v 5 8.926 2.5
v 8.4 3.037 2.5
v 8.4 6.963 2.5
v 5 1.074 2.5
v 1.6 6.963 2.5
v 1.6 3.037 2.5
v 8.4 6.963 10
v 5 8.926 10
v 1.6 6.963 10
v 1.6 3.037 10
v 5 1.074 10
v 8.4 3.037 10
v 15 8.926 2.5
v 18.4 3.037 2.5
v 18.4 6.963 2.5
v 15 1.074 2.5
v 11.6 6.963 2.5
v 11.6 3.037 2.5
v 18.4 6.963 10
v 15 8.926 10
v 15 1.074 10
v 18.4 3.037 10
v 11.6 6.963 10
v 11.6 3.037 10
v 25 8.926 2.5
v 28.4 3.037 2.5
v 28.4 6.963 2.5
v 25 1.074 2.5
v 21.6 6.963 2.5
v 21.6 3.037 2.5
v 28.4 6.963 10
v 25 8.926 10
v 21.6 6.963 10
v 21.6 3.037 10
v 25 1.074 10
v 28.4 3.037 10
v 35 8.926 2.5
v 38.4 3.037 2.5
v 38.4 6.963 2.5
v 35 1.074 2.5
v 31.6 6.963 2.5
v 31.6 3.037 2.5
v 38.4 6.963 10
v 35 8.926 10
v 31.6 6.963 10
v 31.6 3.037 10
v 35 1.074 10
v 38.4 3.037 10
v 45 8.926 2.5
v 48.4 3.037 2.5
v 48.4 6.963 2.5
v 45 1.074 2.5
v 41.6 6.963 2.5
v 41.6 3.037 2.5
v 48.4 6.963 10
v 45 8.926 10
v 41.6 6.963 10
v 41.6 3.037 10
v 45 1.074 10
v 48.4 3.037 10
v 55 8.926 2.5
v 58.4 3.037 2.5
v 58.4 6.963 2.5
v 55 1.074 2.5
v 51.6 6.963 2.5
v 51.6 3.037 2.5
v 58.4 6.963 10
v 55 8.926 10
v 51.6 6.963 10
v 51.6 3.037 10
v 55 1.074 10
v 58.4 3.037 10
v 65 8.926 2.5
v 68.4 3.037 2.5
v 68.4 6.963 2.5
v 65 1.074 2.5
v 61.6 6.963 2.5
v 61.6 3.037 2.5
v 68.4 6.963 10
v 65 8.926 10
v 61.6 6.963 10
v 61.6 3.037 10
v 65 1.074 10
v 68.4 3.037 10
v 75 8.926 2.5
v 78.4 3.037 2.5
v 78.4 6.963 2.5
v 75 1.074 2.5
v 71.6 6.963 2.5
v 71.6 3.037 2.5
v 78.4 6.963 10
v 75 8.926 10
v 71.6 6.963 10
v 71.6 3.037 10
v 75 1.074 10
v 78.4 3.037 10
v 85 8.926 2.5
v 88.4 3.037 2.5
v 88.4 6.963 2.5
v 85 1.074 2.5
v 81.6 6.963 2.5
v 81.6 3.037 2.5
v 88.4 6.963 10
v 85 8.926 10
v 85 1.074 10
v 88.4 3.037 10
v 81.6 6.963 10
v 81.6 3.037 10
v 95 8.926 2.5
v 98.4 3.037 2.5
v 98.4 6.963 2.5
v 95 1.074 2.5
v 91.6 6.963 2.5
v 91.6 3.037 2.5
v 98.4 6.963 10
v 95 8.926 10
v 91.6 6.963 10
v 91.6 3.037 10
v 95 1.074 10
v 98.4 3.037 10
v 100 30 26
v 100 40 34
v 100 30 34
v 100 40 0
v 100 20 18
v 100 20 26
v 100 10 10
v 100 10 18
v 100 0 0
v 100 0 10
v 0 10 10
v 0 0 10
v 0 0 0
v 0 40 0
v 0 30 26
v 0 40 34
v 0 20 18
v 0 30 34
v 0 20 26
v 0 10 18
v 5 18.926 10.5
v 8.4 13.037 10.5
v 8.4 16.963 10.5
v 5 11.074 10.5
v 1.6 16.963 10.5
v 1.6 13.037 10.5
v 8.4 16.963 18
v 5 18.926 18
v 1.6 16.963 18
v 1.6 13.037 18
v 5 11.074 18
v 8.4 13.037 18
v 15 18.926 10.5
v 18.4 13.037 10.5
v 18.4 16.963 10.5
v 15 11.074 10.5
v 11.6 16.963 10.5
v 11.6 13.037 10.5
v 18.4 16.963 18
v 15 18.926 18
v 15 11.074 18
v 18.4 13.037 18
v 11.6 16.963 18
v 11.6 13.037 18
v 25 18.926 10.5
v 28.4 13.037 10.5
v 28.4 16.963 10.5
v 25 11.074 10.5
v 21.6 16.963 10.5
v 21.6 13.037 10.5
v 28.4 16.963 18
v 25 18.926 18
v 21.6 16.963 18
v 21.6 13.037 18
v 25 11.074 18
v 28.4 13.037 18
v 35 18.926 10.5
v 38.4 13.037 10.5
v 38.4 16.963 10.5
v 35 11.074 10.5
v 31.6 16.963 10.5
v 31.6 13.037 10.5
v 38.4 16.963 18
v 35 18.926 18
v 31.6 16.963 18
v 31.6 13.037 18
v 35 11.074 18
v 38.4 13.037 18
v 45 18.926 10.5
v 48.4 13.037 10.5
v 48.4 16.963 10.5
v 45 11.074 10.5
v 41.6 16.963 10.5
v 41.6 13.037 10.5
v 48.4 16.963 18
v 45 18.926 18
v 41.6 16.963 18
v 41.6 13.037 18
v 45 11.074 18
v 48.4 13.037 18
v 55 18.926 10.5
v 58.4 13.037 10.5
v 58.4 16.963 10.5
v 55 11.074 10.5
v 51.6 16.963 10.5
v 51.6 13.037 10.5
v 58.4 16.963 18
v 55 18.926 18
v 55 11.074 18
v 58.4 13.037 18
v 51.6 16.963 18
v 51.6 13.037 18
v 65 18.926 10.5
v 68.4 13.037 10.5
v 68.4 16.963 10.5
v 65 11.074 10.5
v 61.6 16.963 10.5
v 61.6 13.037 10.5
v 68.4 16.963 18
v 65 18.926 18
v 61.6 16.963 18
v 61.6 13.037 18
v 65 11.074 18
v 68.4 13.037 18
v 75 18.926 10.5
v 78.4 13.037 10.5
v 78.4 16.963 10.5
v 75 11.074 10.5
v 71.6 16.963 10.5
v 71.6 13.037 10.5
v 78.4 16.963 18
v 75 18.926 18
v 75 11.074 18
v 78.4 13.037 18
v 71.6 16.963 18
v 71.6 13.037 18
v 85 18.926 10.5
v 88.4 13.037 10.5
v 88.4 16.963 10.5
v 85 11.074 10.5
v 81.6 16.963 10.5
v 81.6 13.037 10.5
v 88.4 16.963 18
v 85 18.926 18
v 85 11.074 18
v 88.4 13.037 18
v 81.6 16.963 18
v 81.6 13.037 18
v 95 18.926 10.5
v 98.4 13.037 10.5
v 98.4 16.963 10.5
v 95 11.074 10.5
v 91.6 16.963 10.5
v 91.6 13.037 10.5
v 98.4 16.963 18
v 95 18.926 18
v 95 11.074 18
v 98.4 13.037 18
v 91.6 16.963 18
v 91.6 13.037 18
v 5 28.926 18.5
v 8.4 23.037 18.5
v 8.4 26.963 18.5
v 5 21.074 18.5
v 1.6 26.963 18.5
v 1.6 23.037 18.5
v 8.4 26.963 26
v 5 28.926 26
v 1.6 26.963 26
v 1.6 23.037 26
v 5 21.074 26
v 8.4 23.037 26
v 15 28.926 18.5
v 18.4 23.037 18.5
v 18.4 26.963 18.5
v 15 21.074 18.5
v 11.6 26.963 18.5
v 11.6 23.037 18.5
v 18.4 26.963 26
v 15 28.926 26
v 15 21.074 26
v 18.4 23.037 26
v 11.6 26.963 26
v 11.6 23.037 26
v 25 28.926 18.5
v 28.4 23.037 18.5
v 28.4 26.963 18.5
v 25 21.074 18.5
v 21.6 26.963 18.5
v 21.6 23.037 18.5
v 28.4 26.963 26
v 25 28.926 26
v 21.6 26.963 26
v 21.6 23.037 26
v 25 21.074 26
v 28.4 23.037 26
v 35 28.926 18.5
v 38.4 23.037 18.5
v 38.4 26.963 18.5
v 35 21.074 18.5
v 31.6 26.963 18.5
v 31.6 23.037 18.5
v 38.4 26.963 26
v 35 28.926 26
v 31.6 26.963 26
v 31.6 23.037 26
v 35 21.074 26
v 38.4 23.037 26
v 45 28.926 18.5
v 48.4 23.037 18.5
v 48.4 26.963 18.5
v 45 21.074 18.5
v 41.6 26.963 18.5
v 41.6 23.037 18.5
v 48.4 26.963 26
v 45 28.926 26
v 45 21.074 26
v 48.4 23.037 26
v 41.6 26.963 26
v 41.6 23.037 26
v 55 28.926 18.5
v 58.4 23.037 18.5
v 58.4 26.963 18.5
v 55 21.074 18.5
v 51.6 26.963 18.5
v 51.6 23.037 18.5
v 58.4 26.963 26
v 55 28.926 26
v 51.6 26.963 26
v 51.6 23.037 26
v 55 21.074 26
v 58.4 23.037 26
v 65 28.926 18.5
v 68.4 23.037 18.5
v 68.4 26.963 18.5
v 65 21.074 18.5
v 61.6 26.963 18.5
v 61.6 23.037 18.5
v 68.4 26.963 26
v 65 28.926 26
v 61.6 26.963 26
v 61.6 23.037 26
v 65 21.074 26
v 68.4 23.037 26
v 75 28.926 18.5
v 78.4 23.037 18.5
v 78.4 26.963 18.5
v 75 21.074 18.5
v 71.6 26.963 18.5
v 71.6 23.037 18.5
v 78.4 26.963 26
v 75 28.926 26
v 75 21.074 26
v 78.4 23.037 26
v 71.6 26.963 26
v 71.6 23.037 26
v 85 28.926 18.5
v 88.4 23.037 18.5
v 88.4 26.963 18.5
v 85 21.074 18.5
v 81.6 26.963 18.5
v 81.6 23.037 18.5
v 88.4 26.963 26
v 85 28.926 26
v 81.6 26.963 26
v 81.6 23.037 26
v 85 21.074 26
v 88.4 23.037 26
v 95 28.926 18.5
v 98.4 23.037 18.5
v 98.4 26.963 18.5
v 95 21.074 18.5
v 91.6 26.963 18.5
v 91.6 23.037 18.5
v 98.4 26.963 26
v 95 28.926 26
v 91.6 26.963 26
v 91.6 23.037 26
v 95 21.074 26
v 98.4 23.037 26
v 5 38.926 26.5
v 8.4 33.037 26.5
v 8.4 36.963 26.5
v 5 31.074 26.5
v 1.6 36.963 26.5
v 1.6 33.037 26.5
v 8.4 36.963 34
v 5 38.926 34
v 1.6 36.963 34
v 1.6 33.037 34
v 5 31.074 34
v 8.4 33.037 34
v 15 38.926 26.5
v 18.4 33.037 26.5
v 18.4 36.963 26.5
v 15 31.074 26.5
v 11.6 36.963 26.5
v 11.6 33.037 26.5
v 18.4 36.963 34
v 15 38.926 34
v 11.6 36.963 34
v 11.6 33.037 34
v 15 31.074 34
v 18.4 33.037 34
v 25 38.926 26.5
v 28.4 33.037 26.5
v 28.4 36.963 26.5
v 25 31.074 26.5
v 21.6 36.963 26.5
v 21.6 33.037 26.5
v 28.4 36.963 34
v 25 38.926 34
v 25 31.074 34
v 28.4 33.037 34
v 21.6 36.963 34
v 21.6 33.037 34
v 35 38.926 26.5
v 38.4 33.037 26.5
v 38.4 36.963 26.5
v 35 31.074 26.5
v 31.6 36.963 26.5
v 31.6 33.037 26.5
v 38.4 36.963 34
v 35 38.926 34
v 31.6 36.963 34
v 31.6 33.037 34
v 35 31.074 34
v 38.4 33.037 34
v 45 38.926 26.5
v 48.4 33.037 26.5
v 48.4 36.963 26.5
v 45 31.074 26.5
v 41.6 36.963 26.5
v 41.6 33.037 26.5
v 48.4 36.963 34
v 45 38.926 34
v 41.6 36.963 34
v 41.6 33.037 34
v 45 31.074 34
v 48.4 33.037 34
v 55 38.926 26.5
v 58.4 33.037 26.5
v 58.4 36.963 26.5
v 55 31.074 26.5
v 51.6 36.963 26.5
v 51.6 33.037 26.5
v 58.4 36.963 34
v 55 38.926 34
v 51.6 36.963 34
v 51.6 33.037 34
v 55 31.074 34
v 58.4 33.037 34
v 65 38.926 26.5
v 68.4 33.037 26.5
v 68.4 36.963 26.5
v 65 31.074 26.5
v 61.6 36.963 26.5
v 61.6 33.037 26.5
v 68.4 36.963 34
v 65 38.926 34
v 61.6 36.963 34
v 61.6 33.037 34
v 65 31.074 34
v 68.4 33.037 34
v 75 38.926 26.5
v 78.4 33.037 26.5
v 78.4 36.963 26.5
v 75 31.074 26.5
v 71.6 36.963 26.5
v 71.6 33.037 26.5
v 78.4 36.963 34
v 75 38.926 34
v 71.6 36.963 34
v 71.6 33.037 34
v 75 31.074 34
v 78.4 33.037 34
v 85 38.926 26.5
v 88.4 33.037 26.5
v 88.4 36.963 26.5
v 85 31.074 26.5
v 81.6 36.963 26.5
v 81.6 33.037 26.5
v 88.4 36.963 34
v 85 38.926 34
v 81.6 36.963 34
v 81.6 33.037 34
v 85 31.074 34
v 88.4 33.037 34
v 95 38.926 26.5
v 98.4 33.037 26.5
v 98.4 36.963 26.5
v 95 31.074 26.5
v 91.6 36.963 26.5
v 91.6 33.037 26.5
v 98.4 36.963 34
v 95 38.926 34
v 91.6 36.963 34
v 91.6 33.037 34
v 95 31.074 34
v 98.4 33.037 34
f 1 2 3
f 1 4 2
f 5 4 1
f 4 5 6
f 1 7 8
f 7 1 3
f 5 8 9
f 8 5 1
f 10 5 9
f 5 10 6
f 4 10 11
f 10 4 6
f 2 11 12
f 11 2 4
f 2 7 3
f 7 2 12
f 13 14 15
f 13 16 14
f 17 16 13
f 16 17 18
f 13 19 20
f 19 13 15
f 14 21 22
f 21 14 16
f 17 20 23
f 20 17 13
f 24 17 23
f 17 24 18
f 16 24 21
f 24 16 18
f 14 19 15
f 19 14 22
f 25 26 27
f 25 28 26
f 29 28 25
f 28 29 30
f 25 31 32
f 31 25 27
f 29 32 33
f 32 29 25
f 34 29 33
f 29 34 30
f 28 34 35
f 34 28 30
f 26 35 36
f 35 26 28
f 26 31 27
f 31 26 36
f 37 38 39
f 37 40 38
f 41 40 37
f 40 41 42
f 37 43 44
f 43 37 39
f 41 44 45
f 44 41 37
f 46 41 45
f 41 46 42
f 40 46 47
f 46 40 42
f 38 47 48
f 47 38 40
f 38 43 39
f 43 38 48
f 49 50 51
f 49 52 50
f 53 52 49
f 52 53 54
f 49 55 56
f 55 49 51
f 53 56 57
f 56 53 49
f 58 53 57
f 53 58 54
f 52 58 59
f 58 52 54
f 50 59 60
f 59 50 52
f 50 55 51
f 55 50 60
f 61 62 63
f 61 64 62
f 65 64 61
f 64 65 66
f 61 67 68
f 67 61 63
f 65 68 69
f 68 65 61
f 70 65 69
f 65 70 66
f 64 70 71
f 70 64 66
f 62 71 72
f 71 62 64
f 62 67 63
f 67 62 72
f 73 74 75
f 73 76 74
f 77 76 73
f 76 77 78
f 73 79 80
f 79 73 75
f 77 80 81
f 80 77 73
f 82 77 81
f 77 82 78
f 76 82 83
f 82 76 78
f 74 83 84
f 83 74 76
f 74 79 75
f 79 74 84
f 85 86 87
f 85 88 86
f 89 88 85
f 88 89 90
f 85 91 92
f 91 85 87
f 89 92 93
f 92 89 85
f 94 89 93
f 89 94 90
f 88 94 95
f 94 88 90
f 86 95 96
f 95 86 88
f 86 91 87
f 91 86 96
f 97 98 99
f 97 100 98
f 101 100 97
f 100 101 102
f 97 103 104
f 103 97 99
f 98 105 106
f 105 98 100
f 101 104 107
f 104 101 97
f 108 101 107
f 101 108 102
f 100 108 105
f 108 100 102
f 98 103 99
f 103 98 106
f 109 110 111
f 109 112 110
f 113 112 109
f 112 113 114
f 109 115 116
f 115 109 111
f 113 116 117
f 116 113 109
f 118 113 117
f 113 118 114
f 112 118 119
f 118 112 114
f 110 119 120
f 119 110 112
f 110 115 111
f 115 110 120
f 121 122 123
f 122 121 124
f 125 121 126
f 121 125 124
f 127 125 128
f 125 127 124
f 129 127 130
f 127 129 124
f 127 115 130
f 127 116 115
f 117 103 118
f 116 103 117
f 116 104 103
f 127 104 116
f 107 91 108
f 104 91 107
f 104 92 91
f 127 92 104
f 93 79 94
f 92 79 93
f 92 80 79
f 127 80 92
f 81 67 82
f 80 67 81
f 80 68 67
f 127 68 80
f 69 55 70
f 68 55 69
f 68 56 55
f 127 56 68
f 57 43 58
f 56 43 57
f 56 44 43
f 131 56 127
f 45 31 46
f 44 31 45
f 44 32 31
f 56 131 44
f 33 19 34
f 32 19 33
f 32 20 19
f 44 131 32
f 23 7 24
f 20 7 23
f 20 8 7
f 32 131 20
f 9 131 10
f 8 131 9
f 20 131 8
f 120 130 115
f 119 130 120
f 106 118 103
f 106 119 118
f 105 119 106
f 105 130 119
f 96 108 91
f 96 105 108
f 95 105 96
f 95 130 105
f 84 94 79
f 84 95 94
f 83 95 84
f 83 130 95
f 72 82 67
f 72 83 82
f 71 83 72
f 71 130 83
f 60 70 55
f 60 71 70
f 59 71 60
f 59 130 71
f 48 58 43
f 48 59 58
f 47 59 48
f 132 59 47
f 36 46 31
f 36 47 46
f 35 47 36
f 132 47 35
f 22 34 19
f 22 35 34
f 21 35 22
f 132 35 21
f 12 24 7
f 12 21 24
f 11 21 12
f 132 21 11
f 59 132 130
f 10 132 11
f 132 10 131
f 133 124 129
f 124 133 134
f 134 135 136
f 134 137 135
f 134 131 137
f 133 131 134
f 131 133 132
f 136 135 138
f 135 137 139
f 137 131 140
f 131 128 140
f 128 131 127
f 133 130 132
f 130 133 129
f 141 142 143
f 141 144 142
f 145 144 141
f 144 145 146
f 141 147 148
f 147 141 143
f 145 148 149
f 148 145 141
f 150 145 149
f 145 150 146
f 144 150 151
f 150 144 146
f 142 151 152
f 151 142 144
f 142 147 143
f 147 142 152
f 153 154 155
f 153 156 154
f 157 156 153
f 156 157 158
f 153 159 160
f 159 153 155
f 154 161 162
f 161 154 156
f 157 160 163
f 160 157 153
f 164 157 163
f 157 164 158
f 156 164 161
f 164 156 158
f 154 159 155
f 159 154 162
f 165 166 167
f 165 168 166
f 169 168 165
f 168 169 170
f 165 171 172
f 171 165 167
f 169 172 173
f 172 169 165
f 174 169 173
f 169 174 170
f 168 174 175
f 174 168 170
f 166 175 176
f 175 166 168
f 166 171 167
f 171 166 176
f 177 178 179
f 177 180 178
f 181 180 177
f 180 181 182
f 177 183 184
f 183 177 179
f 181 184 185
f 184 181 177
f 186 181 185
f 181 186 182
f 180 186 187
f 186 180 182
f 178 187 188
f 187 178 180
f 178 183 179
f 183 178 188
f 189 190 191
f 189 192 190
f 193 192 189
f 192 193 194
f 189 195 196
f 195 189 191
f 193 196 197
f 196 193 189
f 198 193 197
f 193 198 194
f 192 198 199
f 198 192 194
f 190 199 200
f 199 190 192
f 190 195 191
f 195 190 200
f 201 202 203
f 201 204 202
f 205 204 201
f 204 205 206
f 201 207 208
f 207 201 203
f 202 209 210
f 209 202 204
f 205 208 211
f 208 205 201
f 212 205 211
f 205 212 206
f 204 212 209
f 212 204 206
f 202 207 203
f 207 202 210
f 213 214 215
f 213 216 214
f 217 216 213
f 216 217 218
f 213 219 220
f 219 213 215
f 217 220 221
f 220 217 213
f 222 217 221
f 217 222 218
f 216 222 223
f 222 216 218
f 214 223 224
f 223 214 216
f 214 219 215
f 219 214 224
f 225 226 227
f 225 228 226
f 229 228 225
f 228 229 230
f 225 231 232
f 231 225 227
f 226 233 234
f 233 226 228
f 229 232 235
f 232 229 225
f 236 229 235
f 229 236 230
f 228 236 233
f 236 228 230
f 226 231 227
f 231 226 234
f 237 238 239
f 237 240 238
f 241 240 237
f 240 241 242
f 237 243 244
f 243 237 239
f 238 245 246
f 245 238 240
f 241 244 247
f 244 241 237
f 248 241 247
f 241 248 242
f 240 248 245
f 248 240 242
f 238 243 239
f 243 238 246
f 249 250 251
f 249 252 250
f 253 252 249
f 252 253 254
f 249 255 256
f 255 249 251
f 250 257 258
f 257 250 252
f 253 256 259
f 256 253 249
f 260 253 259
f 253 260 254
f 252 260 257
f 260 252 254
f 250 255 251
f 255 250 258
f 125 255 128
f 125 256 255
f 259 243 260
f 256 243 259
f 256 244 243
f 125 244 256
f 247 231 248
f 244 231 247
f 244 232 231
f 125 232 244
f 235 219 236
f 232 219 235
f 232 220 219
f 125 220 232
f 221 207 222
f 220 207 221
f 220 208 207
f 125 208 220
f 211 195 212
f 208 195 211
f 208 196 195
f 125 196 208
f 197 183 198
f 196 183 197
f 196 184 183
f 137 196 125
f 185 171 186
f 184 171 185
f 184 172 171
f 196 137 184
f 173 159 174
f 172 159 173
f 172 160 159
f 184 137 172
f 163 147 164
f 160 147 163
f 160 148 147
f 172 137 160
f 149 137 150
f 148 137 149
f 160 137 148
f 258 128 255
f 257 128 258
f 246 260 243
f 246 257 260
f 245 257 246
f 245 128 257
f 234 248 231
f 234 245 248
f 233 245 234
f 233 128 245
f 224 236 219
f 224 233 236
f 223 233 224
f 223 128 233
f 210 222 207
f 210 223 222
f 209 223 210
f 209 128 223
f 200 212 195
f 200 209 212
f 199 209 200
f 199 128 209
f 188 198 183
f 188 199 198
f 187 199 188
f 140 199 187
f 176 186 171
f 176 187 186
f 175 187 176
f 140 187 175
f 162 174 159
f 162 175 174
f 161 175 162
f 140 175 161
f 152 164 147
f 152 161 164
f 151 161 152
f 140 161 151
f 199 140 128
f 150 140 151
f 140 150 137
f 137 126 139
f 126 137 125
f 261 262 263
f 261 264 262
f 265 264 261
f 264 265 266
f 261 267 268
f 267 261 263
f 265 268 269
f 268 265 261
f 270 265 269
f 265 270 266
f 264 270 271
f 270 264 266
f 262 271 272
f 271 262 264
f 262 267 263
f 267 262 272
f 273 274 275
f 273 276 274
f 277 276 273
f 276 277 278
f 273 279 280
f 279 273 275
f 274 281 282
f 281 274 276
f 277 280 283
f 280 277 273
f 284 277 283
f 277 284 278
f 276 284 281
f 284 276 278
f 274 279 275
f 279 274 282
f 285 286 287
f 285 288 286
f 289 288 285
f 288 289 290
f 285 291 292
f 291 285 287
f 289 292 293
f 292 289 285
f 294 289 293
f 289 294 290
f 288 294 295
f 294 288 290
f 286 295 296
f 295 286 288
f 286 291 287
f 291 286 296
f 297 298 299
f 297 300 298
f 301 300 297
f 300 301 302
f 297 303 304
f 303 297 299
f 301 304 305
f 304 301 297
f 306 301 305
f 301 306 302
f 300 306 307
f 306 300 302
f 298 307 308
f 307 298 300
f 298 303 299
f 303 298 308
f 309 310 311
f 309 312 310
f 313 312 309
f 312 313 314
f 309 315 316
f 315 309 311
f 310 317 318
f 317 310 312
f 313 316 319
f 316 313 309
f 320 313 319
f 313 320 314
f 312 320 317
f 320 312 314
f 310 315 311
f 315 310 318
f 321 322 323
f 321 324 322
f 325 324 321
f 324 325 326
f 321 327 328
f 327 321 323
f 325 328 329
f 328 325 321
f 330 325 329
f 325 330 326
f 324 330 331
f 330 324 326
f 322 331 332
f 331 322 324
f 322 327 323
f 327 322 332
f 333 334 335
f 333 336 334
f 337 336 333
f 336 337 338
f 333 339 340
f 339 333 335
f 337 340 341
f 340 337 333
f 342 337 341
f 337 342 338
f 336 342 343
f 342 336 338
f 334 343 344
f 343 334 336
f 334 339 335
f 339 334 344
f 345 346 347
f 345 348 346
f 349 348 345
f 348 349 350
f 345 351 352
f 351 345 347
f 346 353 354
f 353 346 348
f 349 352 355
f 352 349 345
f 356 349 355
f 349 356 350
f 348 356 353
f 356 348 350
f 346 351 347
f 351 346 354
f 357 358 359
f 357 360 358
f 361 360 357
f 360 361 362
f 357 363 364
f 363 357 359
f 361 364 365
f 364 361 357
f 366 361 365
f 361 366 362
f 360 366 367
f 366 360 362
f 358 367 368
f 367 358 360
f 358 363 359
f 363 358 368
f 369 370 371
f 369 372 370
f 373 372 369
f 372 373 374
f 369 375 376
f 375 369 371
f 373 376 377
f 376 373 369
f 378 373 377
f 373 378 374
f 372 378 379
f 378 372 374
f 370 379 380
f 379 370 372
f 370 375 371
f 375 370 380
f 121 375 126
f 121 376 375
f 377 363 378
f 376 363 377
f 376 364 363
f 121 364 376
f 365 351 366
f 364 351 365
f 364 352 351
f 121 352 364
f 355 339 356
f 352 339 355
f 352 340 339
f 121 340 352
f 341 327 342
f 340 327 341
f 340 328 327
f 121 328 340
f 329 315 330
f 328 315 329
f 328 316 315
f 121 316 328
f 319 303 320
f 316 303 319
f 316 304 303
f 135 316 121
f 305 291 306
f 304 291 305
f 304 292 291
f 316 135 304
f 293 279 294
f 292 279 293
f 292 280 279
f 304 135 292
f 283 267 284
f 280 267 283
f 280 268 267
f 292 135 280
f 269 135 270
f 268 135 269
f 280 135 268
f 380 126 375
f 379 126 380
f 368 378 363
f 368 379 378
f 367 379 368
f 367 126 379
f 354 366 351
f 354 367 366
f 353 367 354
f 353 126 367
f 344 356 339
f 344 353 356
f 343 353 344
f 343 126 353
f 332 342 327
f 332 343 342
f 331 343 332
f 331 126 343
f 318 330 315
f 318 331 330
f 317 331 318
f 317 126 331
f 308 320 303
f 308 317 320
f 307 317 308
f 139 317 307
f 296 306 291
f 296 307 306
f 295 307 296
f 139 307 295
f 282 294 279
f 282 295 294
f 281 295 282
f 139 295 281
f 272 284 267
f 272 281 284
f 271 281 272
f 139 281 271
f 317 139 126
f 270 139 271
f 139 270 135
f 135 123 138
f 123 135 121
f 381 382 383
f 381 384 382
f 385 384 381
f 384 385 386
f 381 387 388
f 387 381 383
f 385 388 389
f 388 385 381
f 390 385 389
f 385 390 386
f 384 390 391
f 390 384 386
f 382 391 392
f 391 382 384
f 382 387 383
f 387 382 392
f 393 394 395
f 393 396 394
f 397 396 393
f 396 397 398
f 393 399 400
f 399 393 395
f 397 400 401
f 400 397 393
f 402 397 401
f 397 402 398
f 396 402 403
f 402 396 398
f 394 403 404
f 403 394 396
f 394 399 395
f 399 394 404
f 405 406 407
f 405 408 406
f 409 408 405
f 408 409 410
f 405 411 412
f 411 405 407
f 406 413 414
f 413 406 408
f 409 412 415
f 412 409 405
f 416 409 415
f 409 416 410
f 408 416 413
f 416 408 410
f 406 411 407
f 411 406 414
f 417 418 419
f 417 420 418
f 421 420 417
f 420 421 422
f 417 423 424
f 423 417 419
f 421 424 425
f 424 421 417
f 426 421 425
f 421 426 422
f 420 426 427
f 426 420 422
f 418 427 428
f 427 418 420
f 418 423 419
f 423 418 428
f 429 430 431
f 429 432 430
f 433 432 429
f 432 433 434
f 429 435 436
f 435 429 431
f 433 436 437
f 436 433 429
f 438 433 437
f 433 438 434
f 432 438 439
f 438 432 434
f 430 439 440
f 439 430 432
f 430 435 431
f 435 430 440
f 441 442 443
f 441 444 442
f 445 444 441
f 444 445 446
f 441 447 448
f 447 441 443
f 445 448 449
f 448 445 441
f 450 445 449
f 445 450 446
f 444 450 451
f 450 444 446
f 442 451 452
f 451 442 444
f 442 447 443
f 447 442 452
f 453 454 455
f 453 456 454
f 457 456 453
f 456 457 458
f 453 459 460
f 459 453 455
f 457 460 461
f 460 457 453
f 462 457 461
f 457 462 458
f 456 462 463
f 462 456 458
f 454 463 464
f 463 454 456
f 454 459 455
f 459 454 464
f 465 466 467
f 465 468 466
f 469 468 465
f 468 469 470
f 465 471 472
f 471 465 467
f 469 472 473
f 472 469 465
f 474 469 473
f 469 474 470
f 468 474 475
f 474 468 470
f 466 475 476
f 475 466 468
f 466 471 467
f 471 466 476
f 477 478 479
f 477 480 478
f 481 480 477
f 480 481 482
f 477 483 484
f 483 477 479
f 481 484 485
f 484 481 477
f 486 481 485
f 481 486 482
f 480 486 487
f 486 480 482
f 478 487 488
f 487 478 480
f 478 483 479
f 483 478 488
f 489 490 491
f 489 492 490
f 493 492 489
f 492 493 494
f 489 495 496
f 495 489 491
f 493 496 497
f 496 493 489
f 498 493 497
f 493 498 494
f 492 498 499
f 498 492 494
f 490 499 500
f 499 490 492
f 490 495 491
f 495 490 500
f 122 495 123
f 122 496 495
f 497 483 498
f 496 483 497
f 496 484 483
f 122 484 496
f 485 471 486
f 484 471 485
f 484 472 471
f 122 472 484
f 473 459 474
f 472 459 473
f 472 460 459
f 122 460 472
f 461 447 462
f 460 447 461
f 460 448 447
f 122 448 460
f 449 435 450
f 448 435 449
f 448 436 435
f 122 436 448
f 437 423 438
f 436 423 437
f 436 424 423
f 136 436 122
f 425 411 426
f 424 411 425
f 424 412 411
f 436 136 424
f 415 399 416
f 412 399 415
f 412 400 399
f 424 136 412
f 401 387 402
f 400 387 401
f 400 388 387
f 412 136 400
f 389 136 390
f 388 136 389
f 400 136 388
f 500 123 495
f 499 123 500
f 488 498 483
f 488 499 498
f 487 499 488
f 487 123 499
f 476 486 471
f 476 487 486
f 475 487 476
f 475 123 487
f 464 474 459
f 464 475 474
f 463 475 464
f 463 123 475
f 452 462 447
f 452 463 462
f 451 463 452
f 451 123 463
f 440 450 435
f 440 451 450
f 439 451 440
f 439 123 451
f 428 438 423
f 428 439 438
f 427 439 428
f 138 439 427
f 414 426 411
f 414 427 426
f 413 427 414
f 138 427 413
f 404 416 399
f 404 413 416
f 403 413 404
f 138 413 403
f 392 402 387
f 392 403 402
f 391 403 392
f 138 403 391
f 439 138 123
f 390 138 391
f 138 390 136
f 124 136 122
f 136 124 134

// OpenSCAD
$fn=30;

// How many rows of bits do you want?
stairs = 4;
// How much heigher shouch each step be?
strairinc = 8;
// How many bits go on each step?
number = 10;

width = 10 * (number);

for (i=[1:stairs]) {
	row(i);
}

module row(pos) {
	translate([0, 10*(pos-1), 0])
		difference() {
				cube([width, 10, 10+(strairinc*(pos-1))]);
				for (i=[0:number-1]) {
					bit(5+10*i,5,0.5+(strairinc*(pos-1)));
				}
			}
}

module bit(x,y,z) {
	translate([0,0,4+2+z]) linear_extrude(height=8,center=true) hexagon(3.4,x,y);
}

module hexagon(r,x,y){
polygon(points=[[(r+x),(r*(tan(30)))+y],
                [x,(r*(2/sqrt(3)))+y],
                [-r+x,(r*(tan(30)))+y],
                [-r+x,-(r*(tan(30)))+y],
                [x,-(r*(2/sqrt(3)))+y],
                [r+x,-(r*(tan(30)))+y]]);

 }
